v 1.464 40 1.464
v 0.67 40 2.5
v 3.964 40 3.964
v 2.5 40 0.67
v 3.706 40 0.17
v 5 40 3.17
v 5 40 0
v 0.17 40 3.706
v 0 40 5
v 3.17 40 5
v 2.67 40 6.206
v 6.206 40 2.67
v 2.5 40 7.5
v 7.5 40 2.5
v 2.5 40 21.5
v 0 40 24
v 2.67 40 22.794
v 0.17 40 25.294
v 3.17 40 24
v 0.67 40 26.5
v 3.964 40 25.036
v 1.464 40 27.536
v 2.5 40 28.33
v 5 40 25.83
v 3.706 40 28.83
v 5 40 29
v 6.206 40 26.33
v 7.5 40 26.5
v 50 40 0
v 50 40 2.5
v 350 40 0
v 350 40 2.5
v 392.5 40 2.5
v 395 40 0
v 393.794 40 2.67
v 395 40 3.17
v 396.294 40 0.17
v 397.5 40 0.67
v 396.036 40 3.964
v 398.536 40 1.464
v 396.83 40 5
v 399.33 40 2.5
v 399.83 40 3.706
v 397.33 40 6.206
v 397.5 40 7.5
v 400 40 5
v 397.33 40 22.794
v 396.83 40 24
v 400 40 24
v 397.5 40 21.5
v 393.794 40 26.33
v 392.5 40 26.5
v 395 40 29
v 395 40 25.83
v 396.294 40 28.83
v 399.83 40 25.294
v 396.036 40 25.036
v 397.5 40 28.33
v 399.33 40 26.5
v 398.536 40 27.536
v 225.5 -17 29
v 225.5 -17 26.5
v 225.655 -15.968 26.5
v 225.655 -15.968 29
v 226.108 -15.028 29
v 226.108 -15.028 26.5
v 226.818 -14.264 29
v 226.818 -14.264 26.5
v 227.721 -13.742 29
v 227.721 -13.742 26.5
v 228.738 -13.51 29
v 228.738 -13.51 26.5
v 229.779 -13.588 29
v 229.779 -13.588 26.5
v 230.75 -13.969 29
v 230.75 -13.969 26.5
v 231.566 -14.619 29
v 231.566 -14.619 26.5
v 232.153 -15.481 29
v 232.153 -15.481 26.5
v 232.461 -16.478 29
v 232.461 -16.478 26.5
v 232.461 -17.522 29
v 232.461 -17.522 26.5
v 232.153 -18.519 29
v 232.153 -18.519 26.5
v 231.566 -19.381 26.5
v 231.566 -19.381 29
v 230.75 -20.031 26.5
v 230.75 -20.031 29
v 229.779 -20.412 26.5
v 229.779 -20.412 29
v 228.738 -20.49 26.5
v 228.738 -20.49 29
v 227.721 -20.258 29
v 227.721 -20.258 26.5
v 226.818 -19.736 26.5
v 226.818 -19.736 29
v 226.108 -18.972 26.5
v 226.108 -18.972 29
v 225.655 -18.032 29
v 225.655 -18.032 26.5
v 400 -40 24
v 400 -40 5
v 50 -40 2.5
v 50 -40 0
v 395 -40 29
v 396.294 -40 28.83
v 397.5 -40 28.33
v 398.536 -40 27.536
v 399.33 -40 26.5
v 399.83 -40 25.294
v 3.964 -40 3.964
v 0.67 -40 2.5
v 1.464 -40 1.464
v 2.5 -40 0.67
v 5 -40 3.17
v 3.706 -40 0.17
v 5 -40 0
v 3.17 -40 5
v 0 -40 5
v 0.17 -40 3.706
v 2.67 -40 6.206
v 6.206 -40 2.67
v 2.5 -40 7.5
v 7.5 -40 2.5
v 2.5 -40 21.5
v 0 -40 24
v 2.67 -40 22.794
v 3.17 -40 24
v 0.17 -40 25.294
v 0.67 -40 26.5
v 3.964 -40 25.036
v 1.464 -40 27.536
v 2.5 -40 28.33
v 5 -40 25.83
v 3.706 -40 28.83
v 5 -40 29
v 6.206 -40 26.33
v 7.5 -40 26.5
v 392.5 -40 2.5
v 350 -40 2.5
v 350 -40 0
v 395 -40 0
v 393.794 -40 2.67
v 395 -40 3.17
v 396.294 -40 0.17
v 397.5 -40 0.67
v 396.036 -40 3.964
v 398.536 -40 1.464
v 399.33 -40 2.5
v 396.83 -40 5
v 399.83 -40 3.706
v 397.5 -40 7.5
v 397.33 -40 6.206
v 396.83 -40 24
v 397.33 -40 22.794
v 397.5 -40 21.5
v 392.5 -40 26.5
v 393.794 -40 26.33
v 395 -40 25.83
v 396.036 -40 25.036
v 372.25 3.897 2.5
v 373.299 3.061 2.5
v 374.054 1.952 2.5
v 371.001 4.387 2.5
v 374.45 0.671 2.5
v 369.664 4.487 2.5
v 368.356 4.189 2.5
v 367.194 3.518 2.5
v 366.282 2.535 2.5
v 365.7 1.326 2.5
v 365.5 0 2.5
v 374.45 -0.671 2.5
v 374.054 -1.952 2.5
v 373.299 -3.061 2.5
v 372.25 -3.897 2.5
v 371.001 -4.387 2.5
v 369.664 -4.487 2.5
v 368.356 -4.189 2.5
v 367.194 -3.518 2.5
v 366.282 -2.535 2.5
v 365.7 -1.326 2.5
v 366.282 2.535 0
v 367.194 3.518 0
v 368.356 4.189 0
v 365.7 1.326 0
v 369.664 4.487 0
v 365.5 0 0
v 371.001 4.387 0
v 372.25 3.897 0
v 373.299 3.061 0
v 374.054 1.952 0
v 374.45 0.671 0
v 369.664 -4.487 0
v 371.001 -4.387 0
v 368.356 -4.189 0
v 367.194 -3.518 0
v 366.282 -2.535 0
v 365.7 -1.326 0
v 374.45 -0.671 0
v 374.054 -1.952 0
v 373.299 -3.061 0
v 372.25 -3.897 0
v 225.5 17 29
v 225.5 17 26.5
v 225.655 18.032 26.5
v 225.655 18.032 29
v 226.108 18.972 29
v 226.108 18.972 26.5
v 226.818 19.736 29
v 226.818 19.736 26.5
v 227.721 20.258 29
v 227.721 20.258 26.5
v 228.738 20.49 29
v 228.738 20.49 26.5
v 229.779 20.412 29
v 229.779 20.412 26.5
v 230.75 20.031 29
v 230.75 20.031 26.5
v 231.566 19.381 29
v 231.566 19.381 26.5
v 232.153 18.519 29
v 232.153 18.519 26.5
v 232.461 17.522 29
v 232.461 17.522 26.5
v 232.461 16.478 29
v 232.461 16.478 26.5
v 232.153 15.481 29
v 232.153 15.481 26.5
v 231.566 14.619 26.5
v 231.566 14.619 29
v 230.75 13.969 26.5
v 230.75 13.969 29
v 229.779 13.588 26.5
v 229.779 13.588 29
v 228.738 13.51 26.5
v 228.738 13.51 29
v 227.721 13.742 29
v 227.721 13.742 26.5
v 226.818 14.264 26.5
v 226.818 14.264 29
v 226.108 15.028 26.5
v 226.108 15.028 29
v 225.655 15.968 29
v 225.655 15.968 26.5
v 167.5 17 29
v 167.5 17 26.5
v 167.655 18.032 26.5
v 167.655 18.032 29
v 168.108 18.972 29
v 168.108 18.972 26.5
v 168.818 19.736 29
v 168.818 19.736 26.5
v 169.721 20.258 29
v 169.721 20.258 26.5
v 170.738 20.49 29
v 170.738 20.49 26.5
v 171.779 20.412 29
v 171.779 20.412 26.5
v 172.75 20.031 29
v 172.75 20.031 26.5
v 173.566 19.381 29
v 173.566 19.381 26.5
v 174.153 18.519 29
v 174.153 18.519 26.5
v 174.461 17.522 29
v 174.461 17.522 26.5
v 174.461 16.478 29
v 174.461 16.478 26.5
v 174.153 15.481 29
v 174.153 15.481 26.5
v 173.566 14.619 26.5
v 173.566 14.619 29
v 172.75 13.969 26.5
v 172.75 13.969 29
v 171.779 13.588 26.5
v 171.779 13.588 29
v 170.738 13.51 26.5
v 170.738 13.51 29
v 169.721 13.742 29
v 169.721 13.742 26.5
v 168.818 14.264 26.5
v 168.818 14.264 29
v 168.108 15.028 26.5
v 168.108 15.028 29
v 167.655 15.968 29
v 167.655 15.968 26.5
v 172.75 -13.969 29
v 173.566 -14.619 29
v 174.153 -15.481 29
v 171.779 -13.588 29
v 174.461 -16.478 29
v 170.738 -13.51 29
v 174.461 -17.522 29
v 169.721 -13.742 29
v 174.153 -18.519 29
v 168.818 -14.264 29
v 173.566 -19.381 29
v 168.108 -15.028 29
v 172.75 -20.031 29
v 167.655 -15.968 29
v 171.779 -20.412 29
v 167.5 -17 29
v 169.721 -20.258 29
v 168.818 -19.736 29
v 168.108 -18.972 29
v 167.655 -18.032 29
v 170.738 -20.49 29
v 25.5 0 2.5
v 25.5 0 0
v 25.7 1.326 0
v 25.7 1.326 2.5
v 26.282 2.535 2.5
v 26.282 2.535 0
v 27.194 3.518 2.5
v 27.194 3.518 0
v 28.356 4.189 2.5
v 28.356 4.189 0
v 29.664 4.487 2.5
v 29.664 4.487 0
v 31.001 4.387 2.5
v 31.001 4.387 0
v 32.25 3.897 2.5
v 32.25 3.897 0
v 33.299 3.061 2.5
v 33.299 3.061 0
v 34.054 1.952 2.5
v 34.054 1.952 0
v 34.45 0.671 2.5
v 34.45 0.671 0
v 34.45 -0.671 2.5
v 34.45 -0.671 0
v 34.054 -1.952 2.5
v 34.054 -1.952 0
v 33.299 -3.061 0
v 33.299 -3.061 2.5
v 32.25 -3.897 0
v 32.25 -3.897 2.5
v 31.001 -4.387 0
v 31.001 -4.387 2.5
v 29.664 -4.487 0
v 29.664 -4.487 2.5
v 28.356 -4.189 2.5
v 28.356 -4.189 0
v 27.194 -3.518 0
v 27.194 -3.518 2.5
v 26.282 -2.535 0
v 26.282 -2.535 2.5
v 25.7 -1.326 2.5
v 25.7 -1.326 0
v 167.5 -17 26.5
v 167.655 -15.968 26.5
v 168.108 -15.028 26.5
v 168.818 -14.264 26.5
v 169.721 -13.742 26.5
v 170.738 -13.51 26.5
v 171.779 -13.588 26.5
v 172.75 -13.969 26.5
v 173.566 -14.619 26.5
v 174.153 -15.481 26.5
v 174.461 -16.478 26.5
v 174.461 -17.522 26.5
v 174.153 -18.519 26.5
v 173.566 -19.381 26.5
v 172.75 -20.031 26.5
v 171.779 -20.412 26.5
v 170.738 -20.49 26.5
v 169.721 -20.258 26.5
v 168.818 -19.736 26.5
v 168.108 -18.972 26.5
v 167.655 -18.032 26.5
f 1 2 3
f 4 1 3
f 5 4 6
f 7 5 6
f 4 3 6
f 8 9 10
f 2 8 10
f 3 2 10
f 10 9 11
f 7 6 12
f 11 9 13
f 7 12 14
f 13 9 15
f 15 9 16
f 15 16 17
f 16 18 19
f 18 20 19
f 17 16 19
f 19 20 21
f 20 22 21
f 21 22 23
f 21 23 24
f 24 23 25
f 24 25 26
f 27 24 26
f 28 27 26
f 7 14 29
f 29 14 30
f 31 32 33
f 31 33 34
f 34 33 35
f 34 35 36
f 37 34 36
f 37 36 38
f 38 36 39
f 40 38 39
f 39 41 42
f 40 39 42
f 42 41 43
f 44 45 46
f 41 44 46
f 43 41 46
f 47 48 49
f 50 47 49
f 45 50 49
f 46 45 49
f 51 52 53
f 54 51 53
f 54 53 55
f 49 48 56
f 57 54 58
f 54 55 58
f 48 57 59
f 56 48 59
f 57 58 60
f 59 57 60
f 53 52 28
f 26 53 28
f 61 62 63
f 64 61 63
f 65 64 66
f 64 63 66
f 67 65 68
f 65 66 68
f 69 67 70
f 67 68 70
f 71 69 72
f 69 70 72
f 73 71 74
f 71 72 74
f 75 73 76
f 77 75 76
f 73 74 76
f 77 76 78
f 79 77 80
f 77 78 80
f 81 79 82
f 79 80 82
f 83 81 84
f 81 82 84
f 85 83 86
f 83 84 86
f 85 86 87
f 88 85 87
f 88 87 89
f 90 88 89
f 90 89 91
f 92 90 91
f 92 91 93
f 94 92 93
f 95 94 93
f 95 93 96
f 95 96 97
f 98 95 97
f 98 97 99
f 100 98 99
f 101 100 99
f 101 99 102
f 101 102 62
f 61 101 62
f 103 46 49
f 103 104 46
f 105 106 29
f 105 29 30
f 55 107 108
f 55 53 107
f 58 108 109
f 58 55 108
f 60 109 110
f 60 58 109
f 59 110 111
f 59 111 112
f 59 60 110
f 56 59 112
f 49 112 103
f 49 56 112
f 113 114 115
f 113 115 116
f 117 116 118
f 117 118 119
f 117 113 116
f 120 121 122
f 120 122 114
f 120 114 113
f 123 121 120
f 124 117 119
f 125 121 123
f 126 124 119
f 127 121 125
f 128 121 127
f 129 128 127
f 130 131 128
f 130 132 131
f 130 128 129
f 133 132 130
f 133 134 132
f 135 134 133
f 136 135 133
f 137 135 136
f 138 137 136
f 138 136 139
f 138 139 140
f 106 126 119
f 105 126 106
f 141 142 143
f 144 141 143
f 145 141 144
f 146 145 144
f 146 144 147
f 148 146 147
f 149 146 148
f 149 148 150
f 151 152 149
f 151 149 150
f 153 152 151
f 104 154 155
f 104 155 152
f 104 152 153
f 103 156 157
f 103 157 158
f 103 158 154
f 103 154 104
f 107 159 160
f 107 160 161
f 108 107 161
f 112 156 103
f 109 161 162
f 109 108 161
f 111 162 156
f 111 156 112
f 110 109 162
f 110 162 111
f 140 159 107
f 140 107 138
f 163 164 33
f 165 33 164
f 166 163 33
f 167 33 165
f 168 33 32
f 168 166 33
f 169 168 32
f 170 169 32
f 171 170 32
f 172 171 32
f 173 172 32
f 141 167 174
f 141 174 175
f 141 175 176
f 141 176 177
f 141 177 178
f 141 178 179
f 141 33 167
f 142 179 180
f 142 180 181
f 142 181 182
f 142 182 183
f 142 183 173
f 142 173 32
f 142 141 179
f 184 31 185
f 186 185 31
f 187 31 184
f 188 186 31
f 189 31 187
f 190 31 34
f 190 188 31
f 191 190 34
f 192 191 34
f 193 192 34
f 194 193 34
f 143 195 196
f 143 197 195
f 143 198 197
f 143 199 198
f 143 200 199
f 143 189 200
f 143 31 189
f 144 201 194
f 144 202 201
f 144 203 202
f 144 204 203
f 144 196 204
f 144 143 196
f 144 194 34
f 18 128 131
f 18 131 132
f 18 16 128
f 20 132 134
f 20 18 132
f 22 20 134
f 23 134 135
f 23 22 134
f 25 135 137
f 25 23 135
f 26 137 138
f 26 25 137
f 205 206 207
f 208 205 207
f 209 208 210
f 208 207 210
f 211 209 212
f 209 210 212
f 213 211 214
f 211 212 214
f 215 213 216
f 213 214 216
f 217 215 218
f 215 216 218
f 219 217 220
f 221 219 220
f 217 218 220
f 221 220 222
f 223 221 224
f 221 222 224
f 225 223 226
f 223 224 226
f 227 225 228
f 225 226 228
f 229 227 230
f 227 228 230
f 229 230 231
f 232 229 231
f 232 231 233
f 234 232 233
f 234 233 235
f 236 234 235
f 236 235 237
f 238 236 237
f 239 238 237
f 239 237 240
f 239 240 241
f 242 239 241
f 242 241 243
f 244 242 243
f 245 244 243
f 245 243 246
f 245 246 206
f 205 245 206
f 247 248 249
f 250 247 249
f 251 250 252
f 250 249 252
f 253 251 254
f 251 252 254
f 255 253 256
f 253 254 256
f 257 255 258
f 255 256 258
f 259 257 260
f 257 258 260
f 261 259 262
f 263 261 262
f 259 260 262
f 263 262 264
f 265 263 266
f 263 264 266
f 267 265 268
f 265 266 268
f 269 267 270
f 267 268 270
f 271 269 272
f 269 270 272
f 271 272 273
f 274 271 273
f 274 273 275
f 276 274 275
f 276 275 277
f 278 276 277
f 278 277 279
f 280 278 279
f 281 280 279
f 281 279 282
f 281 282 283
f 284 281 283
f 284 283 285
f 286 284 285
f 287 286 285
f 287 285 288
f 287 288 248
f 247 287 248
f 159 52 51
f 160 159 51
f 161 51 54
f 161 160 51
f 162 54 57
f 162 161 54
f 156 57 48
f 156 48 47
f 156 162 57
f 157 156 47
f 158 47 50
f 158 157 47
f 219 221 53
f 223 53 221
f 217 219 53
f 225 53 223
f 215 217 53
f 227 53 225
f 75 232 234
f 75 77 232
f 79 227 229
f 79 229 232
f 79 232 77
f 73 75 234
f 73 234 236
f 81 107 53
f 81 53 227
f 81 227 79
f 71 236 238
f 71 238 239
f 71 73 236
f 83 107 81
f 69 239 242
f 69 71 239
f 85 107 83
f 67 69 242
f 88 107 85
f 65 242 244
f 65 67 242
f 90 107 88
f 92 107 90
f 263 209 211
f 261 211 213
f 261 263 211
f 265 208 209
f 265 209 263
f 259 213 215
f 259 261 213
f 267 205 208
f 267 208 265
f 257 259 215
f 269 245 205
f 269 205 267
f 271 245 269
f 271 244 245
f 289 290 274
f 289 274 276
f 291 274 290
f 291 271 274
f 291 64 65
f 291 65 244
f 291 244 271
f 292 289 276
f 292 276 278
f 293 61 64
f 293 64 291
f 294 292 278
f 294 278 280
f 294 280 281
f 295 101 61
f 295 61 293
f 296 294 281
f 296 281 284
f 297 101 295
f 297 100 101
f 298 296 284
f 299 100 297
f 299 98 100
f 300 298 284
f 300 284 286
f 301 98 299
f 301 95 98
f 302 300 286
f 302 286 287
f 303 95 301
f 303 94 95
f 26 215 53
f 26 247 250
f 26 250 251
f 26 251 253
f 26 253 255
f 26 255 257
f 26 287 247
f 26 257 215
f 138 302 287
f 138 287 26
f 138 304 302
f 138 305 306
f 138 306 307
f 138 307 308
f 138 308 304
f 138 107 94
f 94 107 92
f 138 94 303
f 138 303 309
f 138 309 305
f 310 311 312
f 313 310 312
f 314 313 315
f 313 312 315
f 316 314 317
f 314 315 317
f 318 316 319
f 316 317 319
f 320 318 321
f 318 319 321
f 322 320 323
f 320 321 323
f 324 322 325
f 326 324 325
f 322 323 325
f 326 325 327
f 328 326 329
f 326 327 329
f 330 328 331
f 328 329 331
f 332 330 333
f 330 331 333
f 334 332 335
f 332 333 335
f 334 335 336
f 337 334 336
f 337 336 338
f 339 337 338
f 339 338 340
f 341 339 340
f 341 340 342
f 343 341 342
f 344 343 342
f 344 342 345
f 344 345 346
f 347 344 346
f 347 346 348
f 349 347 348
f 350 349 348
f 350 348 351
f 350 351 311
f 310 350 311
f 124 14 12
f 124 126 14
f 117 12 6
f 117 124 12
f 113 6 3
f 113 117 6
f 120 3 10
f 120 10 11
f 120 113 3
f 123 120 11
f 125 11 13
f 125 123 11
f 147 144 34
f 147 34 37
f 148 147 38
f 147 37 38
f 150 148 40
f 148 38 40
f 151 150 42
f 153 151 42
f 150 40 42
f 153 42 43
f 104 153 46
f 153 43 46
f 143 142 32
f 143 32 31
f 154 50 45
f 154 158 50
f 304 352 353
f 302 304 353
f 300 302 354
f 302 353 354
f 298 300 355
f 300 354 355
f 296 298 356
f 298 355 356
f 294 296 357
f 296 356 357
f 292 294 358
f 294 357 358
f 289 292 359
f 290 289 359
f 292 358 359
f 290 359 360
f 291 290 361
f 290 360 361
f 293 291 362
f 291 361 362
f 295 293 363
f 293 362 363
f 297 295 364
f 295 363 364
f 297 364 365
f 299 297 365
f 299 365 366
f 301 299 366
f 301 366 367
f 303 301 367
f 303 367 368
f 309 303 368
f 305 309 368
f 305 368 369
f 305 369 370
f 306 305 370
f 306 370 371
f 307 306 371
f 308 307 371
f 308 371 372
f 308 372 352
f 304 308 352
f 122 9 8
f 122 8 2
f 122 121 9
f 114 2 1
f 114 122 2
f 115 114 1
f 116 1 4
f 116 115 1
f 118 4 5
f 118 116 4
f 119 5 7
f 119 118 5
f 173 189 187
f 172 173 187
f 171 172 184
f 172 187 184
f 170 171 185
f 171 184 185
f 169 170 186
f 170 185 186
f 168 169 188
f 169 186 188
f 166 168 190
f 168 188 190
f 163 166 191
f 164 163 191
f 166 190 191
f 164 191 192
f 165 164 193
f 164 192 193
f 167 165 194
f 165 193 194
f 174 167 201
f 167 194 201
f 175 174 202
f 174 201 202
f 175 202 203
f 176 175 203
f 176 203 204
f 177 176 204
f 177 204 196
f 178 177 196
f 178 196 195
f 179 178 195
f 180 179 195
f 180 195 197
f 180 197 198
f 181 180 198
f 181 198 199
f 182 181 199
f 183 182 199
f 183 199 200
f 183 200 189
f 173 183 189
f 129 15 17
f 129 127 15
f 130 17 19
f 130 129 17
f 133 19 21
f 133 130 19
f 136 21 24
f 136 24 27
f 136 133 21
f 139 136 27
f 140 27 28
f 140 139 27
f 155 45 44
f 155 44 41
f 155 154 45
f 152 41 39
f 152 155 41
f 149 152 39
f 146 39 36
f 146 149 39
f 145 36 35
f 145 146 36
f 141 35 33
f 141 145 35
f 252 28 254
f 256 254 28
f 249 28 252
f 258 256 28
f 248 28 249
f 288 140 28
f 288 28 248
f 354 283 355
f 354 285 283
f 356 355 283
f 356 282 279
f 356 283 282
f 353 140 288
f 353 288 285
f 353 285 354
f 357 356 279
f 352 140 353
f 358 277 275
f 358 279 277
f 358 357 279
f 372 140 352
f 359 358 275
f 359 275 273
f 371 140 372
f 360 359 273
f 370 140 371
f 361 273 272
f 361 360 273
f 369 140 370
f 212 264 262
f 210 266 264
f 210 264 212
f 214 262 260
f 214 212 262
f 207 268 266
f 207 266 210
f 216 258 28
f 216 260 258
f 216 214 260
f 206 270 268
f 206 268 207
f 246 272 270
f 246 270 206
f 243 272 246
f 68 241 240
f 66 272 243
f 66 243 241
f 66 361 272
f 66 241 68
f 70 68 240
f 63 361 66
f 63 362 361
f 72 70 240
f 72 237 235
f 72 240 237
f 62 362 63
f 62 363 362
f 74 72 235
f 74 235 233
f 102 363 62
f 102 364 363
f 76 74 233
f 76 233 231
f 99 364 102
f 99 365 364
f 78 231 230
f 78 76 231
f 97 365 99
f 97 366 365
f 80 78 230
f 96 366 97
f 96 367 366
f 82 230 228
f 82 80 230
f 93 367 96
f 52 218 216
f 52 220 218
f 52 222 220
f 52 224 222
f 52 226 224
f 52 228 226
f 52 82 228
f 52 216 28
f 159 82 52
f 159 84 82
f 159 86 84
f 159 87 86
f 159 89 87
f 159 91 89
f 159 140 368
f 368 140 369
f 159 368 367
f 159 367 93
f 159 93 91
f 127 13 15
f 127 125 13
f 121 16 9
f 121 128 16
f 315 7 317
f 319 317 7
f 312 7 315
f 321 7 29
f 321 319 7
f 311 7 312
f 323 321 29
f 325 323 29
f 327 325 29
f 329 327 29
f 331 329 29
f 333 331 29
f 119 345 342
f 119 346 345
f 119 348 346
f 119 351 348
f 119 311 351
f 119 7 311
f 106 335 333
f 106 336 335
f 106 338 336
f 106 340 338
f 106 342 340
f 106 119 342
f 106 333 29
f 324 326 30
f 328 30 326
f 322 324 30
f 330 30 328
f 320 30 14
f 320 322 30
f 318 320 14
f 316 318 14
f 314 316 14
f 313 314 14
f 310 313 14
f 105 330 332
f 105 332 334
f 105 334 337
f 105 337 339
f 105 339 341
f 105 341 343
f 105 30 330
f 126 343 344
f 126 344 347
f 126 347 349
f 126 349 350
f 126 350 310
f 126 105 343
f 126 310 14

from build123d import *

# Parameters (mm, degrees)
F1_DEPTH = 40
F4_D     = 9
F4_DEPTH = 12
F5_D     = 9
F5_DEPTH = 12
F7_D     = 7
F8_R     = 5


with BuildPart() as f1:
    # F0 (on Front) → F1 (new body, symmetric)
    with BuildSketch(Plane.XZ):
        Polygon((0, 29), (0, 0), (50, 0), (50, 2.5), (2.5, 2.5), (2.5, 26.5), (397.5, 26.5), (397.5, 2.5), (350, 2.5), (350, 0), (400, 0), (400, 29), align=None)
    extrude(amount=F1_DEPTH, both=True)

    # F4
    with Locations(Plane.XY.offset(2.5)):
        with Locations((370, 0)):
            Hole(F4_D / 2, depth=F4_DEPTH)

    # F5
    with Locations(Plane.XY.offset(2.5)):
        with Locations((30, 0)):
            Hole(F5_D / 2, depth=F5_DEPTH)

    # F7 (through all)
    with Locations(Plane.XY.offset(29)):
        with Locations((171, 17), (229, 17), (229, -17), (171, -17)):
            Hole(F7_D / 2)

    # F8
    f8_edges = [f1.edges().sort_by_distance(p)[0] for p in [
        (0, 0, 29),
        (0, 0, 0),
        (400, 0, 29),
        (400, 0, 0),
        (2.5, 0, 2.5),
        (2.5, 0, 26.5),
        (397.5, 0, 2.5),
        (397.5, 0, 26.5),
    ]]
    fillet(f8_edges, radius=F8_R)


solid = f1.part
